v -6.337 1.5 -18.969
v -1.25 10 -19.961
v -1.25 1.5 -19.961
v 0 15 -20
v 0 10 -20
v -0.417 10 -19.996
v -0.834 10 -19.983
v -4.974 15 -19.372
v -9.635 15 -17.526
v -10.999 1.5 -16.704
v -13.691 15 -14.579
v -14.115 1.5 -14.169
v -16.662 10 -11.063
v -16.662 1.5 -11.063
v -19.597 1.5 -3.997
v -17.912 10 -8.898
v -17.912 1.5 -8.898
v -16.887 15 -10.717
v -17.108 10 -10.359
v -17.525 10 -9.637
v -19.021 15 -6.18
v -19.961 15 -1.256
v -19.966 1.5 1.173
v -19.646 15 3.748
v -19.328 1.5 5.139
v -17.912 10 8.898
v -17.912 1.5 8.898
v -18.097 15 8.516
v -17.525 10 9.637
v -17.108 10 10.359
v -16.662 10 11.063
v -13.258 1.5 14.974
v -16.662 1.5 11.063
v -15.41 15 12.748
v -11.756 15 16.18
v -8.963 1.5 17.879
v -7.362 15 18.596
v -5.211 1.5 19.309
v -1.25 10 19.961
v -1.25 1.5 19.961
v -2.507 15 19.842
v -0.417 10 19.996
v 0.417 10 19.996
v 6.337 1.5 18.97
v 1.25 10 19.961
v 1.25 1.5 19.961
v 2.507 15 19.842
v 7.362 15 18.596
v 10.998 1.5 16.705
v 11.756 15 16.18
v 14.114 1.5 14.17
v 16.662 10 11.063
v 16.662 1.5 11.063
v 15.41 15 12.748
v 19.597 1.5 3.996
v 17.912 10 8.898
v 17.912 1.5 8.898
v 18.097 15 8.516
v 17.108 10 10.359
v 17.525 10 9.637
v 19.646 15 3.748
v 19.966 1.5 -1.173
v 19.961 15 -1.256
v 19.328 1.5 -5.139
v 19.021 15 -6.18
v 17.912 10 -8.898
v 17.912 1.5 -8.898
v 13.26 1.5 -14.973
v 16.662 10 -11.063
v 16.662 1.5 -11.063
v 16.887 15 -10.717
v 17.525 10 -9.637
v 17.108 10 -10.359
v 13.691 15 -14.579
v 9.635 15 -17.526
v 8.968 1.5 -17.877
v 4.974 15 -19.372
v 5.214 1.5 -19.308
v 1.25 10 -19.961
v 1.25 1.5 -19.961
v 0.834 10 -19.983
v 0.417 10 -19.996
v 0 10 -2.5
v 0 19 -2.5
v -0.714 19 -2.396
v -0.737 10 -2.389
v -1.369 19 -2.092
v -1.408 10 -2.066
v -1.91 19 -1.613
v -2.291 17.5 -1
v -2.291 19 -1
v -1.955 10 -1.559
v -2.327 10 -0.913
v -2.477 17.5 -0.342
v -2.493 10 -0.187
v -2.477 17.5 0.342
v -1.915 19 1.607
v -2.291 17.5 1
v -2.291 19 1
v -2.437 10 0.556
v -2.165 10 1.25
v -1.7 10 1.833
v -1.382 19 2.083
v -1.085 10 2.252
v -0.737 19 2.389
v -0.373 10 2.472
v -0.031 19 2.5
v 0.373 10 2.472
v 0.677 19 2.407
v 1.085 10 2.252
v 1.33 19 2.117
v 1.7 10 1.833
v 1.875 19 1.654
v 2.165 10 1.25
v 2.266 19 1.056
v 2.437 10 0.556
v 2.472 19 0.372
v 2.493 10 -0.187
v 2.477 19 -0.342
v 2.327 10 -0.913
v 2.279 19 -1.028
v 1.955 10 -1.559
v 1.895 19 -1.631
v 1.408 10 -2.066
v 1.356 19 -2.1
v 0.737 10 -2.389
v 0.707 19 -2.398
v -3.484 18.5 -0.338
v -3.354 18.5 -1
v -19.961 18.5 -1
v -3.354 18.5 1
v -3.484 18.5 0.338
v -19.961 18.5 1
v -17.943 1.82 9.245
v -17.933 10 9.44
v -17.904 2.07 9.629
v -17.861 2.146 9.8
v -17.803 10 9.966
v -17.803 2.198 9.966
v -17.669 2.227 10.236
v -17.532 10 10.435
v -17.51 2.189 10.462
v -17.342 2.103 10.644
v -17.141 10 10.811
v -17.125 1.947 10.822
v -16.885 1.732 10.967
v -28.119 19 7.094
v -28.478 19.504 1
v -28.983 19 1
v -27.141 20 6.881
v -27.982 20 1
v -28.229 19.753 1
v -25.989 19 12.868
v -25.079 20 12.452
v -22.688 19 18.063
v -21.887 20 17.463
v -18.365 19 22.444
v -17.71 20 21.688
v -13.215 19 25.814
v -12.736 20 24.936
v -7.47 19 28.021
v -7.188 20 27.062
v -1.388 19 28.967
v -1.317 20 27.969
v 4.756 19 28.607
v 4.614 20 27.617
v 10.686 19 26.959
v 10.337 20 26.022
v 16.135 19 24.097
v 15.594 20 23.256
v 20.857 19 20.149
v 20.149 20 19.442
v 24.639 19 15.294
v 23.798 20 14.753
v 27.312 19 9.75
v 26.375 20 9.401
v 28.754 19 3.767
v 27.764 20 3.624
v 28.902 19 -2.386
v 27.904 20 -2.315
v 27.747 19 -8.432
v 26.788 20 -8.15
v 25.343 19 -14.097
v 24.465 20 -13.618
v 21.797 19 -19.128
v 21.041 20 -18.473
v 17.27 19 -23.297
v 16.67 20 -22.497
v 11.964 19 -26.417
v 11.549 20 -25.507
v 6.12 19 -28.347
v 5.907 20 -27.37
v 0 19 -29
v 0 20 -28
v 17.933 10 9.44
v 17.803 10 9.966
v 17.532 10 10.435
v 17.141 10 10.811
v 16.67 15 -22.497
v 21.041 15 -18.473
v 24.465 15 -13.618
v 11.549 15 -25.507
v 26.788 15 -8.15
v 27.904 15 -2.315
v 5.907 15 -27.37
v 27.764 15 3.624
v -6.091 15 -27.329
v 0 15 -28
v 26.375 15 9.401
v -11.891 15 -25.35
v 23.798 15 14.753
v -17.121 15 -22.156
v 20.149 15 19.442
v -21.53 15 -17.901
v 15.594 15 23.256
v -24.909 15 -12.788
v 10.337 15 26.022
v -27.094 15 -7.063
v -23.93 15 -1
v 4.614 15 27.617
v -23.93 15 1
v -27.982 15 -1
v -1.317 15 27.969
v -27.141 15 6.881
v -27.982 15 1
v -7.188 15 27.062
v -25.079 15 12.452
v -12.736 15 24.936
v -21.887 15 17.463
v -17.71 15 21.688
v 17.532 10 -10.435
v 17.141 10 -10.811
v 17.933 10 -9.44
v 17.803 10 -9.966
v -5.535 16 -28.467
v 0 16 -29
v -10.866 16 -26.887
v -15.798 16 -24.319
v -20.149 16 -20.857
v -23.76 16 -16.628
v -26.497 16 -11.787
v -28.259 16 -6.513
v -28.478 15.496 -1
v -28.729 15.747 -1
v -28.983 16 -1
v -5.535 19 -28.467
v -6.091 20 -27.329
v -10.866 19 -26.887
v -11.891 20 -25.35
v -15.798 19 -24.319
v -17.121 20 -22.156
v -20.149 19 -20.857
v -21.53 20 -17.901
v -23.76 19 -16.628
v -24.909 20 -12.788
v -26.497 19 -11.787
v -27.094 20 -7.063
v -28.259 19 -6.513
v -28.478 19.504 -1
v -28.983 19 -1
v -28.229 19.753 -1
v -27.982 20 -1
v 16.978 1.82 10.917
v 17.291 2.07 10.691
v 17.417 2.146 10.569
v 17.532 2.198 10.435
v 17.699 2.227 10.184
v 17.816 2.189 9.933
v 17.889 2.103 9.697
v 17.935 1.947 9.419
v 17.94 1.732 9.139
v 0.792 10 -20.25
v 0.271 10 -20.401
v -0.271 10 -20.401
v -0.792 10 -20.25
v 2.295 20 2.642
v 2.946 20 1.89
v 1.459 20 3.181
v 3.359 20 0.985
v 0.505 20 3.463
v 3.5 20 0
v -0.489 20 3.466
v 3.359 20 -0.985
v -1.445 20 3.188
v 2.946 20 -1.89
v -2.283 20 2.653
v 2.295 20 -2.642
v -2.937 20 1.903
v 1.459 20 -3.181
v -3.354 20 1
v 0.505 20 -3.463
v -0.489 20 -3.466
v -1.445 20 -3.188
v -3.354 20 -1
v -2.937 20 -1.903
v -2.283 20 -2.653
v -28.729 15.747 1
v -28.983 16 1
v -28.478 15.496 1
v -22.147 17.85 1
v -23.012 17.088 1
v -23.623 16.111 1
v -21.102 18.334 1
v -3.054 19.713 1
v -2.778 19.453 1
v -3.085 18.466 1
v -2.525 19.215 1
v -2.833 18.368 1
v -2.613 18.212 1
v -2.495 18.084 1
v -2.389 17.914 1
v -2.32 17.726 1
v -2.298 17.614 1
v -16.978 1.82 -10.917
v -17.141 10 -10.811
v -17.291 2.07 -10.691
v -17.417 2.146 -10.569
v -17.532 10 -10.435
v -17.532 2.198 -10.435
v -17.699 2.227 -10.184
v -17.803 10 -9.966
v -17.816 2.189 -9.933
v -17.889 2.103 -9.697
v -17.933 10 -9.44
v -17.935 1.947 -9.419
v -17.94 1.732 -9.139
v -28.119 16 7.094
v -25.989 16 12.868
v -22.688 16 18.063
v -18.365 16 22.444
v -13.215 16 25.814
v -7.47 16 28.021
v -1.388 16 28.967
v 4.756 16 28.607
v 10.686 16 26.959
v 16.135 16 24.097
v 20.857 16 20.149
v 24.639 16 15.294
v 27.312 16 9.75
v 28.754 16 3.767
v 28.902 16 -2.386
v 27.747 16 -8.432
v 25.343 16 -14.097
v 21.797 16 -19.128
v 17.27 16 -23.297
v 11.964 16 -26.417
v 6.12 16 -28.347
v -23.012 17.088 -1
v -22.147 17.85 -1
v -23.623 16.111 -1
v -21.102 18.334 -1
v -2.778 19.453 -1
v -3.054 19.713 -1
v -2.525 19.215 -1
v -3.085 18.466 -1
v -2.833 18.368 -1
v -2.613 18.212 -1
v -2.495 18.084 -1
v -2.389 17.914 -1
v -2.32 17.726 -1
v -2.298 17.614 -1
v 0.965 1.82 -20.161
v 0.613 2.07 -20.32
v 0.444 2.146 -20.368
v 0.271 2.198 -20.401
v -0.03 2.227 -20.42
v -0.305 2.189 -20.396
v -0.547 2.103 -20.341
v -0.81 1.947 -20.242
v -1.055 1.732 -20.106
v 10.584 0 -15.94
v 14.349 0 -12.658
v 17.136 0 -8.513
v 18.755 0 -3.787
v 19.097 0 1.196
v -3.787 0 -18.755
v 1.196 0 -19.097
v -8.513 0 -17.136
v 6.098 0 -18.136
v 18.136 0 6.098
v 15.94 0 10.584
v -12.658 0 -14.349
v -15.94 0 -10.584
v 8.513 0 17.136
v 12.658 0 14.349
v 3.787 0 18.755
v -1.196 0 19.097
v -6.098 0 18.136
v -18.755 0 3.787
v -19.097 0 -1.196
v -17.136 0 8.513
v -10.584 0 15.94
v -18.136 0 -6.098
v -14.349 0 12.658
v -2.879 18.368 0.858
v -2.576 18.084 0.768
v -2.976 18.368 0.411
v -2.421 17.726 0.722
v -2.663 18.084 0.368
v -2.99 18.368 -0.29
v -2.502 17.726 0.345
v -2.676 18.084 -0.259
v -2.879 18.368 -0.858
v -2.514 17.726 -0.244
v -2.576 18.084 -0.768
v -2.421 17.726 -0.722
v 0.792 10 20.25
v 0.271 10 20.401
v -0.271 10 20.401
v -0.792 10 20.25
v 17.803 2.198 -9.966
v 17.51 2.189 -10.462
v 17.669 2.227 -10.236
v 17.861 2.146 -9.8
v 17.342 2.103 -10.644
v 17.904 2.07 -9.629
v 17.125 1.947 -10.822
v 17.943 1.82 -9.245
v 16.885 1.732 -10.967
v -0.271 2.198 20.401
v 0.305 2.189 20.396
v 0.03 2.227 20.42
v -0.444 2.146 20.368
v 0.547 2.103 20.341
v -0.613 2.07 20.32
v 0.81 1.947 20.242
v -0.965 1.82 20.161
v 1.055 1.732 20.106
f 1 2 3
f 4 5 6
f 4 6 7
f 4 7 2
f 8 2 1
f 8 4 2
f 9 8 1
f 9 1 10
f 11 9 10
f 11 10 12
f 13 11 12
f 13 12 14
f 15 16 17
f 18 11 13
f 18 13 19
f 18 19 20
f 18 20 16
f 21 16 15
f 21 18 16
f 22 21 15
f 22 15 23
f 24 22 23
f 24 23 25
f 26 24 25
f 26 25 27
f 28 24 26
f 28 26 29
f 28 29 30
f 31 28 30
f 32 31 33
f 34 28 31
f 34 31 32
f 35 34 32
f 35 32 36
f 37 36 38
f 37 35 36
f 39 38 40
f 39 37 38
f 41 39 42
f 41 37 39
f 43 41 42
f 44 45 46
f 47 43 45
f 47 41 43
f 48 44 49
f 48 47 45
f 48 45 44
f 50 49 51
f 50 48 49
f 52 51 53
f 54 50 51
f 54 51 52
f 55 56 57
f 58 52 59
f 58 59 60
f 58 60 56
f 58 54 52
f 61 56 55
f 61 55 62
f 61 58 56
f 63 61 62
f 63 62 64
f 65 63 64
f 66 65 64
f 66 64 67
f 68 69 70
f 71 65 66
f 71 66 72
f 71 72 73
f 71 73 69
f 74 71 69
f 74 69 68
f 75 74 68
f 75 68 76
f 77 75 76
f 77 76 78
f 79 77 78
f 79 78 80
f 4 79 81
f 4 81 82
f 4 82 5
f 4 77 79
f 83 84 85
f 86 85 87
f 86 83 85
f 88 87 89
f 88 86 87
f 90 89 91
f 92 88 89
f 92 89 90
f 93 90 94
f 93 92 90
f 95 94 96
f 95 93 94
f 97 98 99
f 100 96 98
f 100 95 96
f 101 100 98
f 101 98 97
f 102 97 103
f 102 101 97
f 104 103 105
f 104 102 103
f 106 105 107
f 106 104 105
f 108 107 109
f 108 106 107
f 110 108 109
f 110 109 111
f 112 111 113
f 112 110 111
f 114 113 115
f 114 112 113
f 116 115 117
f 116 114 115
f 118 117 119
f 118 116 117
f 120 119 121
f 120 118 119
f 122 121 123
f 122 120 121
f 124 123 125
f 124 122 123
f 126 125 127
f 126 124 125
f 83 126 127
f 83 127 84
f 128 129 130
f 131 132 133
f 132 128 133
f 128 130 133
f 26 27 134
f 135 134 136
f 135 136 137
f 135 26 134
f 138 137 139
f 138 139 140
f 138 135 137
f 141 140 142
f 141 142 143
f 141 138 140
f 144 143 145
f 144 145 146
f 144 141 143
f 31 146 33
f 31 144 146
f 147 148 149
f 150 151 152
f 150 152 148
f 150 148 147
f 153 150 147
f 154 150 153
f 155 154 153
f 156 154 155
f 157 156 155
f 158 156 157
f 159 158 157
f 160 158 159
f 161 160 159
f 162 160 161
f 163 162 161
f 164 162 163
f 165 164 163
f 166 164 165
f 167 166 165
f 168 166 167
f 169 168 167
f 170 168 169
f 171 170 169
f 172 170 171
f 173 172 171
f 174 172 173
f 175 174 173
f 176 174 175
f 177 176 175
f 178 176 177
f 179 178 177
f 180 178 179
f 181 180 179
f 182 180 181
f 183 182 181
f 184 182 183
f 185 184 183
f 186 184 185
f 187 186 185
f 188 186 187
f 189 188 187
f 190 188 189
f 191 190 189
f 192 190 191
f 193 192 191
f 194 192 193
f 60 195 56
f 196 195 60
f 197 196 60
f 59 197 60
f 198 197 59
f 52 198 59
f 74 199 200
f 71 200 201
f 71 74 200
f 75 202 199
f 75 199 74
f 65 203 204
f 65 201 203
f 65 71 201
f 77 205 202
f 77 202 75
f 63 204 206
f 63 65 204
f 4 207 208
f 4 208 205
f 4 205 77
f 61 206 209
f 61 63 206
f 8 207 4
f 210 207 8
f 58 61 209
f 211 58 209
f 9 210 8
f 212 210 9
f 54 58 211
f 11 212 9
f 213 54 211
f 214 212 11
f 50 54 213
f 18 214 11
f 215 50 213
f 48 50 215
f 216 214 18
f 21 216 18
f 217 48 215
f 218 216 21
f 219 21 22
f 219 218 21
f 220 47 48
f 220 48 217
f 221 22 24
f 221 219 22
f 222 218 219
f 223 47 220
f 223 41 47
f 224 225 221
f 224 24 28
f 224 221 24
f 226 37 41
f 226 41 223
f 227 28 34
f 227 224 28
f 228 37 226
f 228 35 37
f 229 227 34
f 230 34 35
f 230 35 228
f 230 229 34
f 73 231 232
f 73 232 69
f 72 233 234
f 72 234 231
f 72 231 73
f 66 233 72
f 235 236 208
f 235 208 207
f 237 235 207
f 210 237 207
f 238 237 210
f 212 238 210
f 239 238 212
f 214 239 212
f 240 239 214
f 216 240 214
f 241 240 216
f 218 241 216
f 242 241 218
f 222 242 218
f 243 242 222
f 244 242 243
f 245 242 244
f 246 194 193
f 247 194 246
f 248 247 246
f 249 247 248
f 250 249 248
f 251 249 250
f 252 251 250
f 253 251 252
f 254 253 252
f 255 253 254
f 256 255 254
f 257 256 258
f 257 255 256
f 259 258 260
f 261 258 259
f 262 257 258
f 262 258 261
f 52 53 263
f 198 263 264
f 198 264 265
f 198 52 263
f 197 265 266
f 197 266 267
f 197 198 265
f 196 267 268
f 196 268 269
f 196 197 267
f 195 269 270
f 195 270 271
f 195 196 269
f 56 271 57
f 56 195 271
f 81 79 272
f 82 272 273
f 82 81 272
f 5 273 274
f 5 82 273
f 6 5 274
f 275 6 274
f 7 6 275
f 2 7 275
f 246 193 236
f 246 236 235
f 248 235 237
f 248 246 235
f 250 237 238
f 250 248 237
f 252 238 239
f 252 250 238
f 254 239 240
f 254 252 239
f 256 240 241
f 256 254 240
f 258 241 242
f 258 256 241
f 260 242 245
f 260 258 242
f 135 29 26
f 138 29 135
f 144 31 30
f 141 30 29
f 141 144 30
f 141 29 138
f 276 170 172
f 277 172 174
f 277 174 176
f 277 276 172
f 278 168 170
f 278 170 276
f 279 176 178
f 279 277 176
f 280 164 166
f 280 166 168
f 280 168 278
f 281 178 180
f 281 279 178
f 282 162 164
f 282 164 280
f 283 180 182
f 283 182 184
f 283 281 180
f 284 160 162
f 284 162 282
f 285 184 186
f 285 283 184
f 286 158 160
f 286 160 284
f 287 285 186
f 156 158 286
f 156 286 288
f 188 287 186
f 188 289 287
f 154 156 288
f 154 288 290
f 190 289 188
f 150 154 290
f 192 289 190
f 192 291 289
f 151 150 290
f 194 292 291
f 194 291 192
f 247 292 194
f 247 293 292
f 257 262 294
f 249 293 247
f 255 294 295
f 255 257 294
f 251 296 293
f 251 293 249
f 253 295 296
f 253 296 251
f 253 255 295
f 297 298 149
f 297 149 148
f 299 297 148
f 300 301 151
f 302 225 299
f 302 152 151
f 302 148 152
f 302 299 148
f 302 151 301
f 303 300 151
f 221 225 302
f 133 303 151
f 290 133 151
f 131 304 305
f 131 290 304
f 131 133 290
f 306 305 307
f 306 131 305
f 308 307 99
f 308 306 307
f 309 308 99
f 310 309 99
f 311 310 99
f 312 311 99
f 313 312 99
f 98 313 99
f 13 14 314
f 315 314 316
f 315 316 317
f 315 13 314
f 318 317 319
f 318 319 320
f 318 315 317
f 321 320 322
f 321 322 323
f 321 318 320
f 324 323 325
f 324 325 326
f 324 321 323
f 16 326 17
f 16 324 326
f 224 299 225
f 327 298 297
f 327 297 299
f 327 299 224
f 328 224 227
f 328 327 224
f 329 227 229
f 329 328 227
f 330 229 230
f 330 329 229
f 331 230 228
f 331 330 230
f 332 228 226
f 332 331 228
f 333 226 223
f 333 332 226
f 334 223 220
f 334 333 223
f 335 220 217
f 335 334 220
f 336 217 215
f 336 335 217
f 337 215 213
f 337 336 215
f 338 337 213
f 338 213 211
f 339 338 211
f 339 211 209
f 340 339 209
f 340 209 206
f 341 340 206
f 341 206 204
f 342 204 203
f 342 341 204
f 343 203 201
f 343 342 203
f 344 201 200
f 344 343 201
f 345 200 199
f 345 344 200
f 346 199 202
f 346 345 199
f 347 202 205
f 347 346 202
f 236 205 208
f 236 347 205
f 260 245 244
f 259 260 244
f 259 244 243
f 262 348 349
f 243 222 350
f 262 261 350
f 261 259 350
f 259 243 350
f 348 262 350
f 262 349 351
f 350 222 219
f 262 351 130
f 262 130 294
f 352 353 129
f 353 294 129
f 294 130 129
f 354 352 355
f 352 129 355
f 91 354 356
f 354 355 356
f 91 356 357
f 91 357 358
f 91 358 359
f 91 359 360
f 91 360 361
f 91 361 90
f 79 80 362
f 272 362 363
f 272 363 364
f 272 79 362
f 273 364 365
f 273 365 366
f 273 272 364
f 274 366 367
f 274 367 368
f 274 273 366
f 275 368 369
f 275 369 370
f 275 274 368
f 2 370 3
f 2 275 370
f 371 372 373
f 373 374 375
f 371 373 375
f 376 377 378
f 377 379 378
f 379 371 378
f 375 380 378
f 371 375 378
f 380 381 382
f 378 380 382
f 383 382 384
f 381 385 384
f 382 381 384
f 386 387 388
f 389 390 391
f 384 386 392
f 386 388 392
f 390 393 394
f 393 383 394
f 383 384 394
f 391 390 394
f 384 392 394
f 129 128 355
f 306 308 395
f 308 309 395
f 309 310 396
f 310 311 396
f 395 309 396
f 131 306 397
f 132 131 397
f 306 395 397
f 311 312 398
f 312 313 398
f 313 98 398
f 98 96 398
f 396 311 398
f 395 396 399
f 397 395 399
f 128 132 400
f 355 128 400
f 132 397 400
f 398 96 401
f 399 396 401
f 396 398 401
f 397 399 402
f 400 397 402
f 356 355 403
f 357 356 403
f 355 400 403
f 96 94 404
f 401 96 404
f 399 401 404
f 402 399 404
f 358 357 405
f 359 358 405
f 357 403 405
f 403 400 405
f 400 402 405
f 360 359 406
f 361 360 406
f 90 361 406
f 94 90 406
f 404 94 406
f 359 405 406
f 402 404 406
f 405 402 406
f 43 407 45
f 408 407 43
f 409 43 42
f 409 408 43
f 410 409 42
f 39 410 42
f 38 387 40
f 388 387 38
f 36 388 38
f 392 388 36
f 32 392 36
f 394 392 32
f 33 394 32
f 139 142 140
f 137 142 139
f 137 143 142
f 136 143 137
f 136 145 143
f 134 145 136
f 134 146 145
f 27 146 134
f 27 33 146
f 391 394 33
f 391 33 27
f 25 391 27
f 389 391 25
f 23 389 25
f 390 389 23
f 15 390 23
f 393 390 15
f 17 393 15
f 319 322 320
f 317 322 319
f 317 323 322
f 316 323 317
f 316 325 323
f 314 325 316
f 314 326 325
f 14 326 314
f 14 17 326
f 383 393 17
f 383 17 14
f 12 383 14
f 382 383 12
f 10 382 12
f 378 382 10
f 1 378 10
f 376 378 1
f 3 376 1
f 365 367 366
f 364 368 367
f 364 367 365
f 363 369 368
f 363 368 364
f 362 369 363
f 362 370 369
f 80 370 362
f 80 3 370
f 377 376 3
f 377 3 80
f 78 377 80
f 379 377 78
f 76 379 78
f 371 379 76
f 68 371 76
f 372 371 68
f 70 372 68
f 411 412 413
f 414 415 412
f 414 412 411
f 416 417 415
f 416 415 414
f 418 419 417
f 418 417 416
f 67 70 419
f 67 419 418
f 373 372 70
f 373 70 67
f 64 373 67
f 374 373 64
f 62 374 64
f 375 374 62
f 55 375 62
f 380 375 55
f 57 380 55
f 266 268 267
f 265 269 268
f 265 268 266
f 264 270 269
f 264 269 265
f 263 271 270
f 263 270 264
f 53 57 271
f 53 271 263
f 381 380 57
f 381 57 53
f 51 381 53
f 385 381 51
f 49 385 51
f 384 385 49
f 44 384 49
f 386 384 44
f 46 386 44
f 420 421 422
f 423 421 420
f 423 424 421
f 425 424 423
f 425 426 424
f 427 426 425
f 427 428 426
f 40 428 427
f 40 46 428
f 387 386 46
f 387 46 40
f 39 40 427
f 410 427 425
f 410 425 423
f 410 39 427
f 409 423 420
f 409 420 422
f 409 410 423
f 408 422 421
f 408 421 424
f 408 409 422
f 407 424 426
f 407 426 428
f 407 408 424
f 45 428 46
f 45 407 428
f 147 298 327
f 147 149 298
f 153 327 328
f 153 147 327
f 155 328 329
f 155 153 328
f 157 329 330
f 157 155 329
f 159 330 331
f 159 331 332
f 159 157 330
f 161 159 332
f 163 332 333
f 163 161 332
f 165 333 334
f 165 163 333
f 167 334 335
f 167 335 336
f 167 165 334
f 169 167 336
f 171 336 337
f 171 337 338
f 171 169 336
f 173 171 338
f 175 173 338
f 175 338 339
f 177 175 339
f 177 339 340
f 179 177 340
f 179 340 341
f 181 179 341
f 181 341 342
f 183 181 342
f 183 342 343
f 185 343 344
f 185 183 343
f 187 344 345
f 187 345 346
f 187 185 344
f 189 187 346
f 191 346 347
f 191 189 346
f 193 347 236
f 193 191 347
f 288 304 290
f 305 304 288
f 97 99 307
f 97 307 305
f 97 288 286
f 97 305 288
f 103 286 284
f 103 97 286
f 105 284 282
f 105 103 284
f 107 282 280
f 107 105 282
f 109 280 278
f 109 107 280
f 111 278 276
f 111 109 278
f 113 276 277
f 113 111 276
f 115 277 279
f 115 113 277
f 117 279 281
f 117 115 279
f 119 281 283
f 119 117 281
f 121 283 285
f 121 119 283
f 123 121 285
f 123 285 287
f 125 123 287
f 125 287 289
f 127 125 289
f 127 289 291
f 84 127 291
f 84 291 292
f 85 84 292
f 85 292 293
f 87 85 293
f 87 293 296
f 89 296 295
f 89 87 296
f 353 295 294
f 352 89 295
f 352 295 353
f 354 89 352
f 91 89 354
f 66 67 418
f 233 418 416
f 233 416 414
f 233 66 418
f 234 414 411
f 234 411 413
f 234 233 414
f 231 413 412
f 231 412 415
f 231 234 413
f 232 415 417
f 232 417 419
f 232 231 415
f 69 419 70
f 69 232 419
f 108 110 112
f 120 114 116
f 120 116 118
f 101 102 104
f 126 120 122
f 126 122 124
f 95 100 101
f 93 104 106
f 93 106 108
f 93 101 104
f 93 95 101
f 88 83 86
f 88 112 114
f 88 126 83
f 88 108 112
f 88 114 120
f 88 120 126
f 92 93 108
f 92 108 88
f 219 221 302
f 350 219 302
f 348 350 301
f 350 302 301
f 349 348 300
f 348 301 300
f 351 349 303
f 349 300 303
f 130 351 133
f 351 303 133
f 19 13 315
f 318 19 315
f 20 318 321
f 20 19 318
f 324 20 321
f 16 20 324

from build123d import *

# Parameters (mm, degrees)
BOSS_EXTRUDE1_START     = -10
BOSS_EXTRUDE1_DEPTH     = 10
CHAMFER1_SIZE           = 1
SKETCH4_W               = 76.07
SKETCH4_H               = 2
CUT_EXTRUDE1_DEPTH      = 46.628938186
CUT_EXTRUDE2_REACH      = 65.581
CUT_EXTRUDE2_END_RADIUS = 2.5
SKETCH5_W               = 2
SKETCH5_H               = 1.5
FILLET1_R               = 4
FILLET2_R               = 1


with BuildPart() as part:
    # Sketch1 → Revolve1 (revolve)
    with BuildSketch(Plane.XY, mode=Mode.PRIVATE) as revolve1_sk:
        Polygon((0, 0), (20, 0), (20, 15), (29, 15), (29, 20), (2.5, 20), (2.5, 10), (0, 10), align=None)
    revolve(revolve1_sk.sketch.rotate(Axis((0, 0, 0), (0, 1, 0)), 90), axis=Axis((0, 0, 0), (0, 1, 0)))

    # Sketch2 → Boss-Extrude1 (add)
    with BuildSketch(Plane.XZ.offset(BOSS_EXTRUDE1_START)):
        with BuildLine():
            ThreePointArc((-1.25, 19.960899278), (0, 20.42), (1.25, 19.960899278))
            ThreePointArc((1.25, 19.960899278), (10, 17.320508076), (16.661645857, 11.062981394))
            ThreePointArc((16.661645857, 11.062981394), (17.684238745, 10.21), (17.911645857, 8.897917884))
            ThreePointArc((17.911645857, 8.897917884), (20, 0), (17.911645857, -8.897917884))
            ThreePointArc((17.911645857, -8.897917884), (17.684238745, -10.21), (16.661645857, -11.062981394))
            ThreePointArc((16.661645857, -11.062981394), (10, -17.320508076), (1.25, -19.960899278))
            ThreePointArc((1.25, -19.960899278), (0, -20.42), (-1.25, -19.960899278))
            ThreePointArc((-1.25, -19.960899278), (-10, -17.320508076), (-16.661645857, -11.062981394))
            ThreePointArc((-16.661645857, -11.062981394), (-17.684238745, -10.21), (-17.911645857, -8.897917884))
            ThreePointArc((-17.911645857, -8.897917884), (-20, 0), (-17.911645857, 8.897917884))
            ThreePointArc((-17.911645857, 8.897917884), (-17.684238745, 10.21), (-16.661645857, 11.062981394))
            ThreePointArc((-16.661645857, 11.062981394), (-10, 17.320508076), (-1.25, 19.960899278))
        make_face()
    extrude(amount=BOSS_EXTRUDE1_DEPTH)

    # Sketch3 → Cut-Revolve1 (revolve, cut)
    with BuildSketch(Plane.XY, mode=Mode.PRIVATE) as cut_revolve1_sk:
        Polygon((-21, 3.232050808), (-18.556624327, -1), (-21, -1), align=None)
    revolve(cut_revolve1_sk.sketch.rotate(Axis((0, 29.336873575, 0), (0, -1, 0)), 273.58332148), axis=Axis((0, 29.336873575, 0), (0, -1, 0)), mode=Mode.SUBTRACT)

    # Chamfer1
    chamfer1_edges = [part.edges().sort_by_distance(p)[0] for p in [
        (0, 20, 2.5),
        (0, 20, 29),
        (0, 15, 29),
    ]]
    chamfer(chamfer1_edges, length=CHAMFER1_SIZE)

    # Sketch4 → Cut-Extrude1 (cut, through all)
    with BuildSketch(Plane.XZ):
        with Locations((-61.965, 0)):
            Rectangle(SKETCH4_W, SKETCH4_H)
    extrude(amount=-CUT_EXTRUDE1_DEPTH, mode=Mode.SUBTRACT)

    # Cut-Extrude2: up to this cylinder (the profile starts outside it)
    cut_extrude2_end = Plane(origin=(0, 19.25, 0), z_dir=(0, -1, 0)) * Cylinder(CUT_EXTRUDE2_END_RADIUS, 137.162, mode=Mode.PRIVATE)
    # Sketch5 → Cut-Extrude2 (cut, up to the surface)
    with BuildSketch(Plane.ZY.offset(23.93), mode=Mode.PRIVATE) as cut_extrude2_sk1:
        with Locations((0, 19.25)):
            Rectangle(SKETCH5_W, SKETCH5_H)
    cut_extrude2_tool1 = extrude(cut_extrude2_sk1.sketch, amount=-CUT_EXTRUDE2_REACH, mode=Mode.PRIVATE) - cut_extrude2_end
    add(cut_extrude2_tool1.solids().sort_by_distance((-23.93, 19.25, 0))[0], mode=Mode.SUBTRACT)

    # Fillet1
    # the kernel refuses this fillet: 4 mm, written as the material it takes off along each edge
    with BuildSketch(Plane(origin=(-23.93, 18.5, 1), x_dir=(1, 0, 0), z_dir=(0, 0, -1))) as fillet1_piece_1:
        with BuildLine():
            CenterArc((3.968626967, 4), FILLET1_R, 187.180755781, 82.819244219)
            Line((0, 3.5), (-0.079372539, 3.49))
            ThreePointArc((-0.079372539, 3.49), (-0.08, 1.75), (-0.08, 0))
            Line((-0.08, 0), (0, -0.08))
            Line((0, -0.08), (3.968626967, -0.08))
            Line((3.968626967, -0.08), (3.968626967, 0))
        make_face()
    extrude(amount=2, mode=Mode.SUBTRACT)

    # Fillet2
    fillet2_edges = [part.edges().sort_by_distance(p)[0] for p in [
        (-2.5, 18.5, 0),
    ]]
    fillet(fillet2_edges, radius=FILLET2_R)


solid = part.part
